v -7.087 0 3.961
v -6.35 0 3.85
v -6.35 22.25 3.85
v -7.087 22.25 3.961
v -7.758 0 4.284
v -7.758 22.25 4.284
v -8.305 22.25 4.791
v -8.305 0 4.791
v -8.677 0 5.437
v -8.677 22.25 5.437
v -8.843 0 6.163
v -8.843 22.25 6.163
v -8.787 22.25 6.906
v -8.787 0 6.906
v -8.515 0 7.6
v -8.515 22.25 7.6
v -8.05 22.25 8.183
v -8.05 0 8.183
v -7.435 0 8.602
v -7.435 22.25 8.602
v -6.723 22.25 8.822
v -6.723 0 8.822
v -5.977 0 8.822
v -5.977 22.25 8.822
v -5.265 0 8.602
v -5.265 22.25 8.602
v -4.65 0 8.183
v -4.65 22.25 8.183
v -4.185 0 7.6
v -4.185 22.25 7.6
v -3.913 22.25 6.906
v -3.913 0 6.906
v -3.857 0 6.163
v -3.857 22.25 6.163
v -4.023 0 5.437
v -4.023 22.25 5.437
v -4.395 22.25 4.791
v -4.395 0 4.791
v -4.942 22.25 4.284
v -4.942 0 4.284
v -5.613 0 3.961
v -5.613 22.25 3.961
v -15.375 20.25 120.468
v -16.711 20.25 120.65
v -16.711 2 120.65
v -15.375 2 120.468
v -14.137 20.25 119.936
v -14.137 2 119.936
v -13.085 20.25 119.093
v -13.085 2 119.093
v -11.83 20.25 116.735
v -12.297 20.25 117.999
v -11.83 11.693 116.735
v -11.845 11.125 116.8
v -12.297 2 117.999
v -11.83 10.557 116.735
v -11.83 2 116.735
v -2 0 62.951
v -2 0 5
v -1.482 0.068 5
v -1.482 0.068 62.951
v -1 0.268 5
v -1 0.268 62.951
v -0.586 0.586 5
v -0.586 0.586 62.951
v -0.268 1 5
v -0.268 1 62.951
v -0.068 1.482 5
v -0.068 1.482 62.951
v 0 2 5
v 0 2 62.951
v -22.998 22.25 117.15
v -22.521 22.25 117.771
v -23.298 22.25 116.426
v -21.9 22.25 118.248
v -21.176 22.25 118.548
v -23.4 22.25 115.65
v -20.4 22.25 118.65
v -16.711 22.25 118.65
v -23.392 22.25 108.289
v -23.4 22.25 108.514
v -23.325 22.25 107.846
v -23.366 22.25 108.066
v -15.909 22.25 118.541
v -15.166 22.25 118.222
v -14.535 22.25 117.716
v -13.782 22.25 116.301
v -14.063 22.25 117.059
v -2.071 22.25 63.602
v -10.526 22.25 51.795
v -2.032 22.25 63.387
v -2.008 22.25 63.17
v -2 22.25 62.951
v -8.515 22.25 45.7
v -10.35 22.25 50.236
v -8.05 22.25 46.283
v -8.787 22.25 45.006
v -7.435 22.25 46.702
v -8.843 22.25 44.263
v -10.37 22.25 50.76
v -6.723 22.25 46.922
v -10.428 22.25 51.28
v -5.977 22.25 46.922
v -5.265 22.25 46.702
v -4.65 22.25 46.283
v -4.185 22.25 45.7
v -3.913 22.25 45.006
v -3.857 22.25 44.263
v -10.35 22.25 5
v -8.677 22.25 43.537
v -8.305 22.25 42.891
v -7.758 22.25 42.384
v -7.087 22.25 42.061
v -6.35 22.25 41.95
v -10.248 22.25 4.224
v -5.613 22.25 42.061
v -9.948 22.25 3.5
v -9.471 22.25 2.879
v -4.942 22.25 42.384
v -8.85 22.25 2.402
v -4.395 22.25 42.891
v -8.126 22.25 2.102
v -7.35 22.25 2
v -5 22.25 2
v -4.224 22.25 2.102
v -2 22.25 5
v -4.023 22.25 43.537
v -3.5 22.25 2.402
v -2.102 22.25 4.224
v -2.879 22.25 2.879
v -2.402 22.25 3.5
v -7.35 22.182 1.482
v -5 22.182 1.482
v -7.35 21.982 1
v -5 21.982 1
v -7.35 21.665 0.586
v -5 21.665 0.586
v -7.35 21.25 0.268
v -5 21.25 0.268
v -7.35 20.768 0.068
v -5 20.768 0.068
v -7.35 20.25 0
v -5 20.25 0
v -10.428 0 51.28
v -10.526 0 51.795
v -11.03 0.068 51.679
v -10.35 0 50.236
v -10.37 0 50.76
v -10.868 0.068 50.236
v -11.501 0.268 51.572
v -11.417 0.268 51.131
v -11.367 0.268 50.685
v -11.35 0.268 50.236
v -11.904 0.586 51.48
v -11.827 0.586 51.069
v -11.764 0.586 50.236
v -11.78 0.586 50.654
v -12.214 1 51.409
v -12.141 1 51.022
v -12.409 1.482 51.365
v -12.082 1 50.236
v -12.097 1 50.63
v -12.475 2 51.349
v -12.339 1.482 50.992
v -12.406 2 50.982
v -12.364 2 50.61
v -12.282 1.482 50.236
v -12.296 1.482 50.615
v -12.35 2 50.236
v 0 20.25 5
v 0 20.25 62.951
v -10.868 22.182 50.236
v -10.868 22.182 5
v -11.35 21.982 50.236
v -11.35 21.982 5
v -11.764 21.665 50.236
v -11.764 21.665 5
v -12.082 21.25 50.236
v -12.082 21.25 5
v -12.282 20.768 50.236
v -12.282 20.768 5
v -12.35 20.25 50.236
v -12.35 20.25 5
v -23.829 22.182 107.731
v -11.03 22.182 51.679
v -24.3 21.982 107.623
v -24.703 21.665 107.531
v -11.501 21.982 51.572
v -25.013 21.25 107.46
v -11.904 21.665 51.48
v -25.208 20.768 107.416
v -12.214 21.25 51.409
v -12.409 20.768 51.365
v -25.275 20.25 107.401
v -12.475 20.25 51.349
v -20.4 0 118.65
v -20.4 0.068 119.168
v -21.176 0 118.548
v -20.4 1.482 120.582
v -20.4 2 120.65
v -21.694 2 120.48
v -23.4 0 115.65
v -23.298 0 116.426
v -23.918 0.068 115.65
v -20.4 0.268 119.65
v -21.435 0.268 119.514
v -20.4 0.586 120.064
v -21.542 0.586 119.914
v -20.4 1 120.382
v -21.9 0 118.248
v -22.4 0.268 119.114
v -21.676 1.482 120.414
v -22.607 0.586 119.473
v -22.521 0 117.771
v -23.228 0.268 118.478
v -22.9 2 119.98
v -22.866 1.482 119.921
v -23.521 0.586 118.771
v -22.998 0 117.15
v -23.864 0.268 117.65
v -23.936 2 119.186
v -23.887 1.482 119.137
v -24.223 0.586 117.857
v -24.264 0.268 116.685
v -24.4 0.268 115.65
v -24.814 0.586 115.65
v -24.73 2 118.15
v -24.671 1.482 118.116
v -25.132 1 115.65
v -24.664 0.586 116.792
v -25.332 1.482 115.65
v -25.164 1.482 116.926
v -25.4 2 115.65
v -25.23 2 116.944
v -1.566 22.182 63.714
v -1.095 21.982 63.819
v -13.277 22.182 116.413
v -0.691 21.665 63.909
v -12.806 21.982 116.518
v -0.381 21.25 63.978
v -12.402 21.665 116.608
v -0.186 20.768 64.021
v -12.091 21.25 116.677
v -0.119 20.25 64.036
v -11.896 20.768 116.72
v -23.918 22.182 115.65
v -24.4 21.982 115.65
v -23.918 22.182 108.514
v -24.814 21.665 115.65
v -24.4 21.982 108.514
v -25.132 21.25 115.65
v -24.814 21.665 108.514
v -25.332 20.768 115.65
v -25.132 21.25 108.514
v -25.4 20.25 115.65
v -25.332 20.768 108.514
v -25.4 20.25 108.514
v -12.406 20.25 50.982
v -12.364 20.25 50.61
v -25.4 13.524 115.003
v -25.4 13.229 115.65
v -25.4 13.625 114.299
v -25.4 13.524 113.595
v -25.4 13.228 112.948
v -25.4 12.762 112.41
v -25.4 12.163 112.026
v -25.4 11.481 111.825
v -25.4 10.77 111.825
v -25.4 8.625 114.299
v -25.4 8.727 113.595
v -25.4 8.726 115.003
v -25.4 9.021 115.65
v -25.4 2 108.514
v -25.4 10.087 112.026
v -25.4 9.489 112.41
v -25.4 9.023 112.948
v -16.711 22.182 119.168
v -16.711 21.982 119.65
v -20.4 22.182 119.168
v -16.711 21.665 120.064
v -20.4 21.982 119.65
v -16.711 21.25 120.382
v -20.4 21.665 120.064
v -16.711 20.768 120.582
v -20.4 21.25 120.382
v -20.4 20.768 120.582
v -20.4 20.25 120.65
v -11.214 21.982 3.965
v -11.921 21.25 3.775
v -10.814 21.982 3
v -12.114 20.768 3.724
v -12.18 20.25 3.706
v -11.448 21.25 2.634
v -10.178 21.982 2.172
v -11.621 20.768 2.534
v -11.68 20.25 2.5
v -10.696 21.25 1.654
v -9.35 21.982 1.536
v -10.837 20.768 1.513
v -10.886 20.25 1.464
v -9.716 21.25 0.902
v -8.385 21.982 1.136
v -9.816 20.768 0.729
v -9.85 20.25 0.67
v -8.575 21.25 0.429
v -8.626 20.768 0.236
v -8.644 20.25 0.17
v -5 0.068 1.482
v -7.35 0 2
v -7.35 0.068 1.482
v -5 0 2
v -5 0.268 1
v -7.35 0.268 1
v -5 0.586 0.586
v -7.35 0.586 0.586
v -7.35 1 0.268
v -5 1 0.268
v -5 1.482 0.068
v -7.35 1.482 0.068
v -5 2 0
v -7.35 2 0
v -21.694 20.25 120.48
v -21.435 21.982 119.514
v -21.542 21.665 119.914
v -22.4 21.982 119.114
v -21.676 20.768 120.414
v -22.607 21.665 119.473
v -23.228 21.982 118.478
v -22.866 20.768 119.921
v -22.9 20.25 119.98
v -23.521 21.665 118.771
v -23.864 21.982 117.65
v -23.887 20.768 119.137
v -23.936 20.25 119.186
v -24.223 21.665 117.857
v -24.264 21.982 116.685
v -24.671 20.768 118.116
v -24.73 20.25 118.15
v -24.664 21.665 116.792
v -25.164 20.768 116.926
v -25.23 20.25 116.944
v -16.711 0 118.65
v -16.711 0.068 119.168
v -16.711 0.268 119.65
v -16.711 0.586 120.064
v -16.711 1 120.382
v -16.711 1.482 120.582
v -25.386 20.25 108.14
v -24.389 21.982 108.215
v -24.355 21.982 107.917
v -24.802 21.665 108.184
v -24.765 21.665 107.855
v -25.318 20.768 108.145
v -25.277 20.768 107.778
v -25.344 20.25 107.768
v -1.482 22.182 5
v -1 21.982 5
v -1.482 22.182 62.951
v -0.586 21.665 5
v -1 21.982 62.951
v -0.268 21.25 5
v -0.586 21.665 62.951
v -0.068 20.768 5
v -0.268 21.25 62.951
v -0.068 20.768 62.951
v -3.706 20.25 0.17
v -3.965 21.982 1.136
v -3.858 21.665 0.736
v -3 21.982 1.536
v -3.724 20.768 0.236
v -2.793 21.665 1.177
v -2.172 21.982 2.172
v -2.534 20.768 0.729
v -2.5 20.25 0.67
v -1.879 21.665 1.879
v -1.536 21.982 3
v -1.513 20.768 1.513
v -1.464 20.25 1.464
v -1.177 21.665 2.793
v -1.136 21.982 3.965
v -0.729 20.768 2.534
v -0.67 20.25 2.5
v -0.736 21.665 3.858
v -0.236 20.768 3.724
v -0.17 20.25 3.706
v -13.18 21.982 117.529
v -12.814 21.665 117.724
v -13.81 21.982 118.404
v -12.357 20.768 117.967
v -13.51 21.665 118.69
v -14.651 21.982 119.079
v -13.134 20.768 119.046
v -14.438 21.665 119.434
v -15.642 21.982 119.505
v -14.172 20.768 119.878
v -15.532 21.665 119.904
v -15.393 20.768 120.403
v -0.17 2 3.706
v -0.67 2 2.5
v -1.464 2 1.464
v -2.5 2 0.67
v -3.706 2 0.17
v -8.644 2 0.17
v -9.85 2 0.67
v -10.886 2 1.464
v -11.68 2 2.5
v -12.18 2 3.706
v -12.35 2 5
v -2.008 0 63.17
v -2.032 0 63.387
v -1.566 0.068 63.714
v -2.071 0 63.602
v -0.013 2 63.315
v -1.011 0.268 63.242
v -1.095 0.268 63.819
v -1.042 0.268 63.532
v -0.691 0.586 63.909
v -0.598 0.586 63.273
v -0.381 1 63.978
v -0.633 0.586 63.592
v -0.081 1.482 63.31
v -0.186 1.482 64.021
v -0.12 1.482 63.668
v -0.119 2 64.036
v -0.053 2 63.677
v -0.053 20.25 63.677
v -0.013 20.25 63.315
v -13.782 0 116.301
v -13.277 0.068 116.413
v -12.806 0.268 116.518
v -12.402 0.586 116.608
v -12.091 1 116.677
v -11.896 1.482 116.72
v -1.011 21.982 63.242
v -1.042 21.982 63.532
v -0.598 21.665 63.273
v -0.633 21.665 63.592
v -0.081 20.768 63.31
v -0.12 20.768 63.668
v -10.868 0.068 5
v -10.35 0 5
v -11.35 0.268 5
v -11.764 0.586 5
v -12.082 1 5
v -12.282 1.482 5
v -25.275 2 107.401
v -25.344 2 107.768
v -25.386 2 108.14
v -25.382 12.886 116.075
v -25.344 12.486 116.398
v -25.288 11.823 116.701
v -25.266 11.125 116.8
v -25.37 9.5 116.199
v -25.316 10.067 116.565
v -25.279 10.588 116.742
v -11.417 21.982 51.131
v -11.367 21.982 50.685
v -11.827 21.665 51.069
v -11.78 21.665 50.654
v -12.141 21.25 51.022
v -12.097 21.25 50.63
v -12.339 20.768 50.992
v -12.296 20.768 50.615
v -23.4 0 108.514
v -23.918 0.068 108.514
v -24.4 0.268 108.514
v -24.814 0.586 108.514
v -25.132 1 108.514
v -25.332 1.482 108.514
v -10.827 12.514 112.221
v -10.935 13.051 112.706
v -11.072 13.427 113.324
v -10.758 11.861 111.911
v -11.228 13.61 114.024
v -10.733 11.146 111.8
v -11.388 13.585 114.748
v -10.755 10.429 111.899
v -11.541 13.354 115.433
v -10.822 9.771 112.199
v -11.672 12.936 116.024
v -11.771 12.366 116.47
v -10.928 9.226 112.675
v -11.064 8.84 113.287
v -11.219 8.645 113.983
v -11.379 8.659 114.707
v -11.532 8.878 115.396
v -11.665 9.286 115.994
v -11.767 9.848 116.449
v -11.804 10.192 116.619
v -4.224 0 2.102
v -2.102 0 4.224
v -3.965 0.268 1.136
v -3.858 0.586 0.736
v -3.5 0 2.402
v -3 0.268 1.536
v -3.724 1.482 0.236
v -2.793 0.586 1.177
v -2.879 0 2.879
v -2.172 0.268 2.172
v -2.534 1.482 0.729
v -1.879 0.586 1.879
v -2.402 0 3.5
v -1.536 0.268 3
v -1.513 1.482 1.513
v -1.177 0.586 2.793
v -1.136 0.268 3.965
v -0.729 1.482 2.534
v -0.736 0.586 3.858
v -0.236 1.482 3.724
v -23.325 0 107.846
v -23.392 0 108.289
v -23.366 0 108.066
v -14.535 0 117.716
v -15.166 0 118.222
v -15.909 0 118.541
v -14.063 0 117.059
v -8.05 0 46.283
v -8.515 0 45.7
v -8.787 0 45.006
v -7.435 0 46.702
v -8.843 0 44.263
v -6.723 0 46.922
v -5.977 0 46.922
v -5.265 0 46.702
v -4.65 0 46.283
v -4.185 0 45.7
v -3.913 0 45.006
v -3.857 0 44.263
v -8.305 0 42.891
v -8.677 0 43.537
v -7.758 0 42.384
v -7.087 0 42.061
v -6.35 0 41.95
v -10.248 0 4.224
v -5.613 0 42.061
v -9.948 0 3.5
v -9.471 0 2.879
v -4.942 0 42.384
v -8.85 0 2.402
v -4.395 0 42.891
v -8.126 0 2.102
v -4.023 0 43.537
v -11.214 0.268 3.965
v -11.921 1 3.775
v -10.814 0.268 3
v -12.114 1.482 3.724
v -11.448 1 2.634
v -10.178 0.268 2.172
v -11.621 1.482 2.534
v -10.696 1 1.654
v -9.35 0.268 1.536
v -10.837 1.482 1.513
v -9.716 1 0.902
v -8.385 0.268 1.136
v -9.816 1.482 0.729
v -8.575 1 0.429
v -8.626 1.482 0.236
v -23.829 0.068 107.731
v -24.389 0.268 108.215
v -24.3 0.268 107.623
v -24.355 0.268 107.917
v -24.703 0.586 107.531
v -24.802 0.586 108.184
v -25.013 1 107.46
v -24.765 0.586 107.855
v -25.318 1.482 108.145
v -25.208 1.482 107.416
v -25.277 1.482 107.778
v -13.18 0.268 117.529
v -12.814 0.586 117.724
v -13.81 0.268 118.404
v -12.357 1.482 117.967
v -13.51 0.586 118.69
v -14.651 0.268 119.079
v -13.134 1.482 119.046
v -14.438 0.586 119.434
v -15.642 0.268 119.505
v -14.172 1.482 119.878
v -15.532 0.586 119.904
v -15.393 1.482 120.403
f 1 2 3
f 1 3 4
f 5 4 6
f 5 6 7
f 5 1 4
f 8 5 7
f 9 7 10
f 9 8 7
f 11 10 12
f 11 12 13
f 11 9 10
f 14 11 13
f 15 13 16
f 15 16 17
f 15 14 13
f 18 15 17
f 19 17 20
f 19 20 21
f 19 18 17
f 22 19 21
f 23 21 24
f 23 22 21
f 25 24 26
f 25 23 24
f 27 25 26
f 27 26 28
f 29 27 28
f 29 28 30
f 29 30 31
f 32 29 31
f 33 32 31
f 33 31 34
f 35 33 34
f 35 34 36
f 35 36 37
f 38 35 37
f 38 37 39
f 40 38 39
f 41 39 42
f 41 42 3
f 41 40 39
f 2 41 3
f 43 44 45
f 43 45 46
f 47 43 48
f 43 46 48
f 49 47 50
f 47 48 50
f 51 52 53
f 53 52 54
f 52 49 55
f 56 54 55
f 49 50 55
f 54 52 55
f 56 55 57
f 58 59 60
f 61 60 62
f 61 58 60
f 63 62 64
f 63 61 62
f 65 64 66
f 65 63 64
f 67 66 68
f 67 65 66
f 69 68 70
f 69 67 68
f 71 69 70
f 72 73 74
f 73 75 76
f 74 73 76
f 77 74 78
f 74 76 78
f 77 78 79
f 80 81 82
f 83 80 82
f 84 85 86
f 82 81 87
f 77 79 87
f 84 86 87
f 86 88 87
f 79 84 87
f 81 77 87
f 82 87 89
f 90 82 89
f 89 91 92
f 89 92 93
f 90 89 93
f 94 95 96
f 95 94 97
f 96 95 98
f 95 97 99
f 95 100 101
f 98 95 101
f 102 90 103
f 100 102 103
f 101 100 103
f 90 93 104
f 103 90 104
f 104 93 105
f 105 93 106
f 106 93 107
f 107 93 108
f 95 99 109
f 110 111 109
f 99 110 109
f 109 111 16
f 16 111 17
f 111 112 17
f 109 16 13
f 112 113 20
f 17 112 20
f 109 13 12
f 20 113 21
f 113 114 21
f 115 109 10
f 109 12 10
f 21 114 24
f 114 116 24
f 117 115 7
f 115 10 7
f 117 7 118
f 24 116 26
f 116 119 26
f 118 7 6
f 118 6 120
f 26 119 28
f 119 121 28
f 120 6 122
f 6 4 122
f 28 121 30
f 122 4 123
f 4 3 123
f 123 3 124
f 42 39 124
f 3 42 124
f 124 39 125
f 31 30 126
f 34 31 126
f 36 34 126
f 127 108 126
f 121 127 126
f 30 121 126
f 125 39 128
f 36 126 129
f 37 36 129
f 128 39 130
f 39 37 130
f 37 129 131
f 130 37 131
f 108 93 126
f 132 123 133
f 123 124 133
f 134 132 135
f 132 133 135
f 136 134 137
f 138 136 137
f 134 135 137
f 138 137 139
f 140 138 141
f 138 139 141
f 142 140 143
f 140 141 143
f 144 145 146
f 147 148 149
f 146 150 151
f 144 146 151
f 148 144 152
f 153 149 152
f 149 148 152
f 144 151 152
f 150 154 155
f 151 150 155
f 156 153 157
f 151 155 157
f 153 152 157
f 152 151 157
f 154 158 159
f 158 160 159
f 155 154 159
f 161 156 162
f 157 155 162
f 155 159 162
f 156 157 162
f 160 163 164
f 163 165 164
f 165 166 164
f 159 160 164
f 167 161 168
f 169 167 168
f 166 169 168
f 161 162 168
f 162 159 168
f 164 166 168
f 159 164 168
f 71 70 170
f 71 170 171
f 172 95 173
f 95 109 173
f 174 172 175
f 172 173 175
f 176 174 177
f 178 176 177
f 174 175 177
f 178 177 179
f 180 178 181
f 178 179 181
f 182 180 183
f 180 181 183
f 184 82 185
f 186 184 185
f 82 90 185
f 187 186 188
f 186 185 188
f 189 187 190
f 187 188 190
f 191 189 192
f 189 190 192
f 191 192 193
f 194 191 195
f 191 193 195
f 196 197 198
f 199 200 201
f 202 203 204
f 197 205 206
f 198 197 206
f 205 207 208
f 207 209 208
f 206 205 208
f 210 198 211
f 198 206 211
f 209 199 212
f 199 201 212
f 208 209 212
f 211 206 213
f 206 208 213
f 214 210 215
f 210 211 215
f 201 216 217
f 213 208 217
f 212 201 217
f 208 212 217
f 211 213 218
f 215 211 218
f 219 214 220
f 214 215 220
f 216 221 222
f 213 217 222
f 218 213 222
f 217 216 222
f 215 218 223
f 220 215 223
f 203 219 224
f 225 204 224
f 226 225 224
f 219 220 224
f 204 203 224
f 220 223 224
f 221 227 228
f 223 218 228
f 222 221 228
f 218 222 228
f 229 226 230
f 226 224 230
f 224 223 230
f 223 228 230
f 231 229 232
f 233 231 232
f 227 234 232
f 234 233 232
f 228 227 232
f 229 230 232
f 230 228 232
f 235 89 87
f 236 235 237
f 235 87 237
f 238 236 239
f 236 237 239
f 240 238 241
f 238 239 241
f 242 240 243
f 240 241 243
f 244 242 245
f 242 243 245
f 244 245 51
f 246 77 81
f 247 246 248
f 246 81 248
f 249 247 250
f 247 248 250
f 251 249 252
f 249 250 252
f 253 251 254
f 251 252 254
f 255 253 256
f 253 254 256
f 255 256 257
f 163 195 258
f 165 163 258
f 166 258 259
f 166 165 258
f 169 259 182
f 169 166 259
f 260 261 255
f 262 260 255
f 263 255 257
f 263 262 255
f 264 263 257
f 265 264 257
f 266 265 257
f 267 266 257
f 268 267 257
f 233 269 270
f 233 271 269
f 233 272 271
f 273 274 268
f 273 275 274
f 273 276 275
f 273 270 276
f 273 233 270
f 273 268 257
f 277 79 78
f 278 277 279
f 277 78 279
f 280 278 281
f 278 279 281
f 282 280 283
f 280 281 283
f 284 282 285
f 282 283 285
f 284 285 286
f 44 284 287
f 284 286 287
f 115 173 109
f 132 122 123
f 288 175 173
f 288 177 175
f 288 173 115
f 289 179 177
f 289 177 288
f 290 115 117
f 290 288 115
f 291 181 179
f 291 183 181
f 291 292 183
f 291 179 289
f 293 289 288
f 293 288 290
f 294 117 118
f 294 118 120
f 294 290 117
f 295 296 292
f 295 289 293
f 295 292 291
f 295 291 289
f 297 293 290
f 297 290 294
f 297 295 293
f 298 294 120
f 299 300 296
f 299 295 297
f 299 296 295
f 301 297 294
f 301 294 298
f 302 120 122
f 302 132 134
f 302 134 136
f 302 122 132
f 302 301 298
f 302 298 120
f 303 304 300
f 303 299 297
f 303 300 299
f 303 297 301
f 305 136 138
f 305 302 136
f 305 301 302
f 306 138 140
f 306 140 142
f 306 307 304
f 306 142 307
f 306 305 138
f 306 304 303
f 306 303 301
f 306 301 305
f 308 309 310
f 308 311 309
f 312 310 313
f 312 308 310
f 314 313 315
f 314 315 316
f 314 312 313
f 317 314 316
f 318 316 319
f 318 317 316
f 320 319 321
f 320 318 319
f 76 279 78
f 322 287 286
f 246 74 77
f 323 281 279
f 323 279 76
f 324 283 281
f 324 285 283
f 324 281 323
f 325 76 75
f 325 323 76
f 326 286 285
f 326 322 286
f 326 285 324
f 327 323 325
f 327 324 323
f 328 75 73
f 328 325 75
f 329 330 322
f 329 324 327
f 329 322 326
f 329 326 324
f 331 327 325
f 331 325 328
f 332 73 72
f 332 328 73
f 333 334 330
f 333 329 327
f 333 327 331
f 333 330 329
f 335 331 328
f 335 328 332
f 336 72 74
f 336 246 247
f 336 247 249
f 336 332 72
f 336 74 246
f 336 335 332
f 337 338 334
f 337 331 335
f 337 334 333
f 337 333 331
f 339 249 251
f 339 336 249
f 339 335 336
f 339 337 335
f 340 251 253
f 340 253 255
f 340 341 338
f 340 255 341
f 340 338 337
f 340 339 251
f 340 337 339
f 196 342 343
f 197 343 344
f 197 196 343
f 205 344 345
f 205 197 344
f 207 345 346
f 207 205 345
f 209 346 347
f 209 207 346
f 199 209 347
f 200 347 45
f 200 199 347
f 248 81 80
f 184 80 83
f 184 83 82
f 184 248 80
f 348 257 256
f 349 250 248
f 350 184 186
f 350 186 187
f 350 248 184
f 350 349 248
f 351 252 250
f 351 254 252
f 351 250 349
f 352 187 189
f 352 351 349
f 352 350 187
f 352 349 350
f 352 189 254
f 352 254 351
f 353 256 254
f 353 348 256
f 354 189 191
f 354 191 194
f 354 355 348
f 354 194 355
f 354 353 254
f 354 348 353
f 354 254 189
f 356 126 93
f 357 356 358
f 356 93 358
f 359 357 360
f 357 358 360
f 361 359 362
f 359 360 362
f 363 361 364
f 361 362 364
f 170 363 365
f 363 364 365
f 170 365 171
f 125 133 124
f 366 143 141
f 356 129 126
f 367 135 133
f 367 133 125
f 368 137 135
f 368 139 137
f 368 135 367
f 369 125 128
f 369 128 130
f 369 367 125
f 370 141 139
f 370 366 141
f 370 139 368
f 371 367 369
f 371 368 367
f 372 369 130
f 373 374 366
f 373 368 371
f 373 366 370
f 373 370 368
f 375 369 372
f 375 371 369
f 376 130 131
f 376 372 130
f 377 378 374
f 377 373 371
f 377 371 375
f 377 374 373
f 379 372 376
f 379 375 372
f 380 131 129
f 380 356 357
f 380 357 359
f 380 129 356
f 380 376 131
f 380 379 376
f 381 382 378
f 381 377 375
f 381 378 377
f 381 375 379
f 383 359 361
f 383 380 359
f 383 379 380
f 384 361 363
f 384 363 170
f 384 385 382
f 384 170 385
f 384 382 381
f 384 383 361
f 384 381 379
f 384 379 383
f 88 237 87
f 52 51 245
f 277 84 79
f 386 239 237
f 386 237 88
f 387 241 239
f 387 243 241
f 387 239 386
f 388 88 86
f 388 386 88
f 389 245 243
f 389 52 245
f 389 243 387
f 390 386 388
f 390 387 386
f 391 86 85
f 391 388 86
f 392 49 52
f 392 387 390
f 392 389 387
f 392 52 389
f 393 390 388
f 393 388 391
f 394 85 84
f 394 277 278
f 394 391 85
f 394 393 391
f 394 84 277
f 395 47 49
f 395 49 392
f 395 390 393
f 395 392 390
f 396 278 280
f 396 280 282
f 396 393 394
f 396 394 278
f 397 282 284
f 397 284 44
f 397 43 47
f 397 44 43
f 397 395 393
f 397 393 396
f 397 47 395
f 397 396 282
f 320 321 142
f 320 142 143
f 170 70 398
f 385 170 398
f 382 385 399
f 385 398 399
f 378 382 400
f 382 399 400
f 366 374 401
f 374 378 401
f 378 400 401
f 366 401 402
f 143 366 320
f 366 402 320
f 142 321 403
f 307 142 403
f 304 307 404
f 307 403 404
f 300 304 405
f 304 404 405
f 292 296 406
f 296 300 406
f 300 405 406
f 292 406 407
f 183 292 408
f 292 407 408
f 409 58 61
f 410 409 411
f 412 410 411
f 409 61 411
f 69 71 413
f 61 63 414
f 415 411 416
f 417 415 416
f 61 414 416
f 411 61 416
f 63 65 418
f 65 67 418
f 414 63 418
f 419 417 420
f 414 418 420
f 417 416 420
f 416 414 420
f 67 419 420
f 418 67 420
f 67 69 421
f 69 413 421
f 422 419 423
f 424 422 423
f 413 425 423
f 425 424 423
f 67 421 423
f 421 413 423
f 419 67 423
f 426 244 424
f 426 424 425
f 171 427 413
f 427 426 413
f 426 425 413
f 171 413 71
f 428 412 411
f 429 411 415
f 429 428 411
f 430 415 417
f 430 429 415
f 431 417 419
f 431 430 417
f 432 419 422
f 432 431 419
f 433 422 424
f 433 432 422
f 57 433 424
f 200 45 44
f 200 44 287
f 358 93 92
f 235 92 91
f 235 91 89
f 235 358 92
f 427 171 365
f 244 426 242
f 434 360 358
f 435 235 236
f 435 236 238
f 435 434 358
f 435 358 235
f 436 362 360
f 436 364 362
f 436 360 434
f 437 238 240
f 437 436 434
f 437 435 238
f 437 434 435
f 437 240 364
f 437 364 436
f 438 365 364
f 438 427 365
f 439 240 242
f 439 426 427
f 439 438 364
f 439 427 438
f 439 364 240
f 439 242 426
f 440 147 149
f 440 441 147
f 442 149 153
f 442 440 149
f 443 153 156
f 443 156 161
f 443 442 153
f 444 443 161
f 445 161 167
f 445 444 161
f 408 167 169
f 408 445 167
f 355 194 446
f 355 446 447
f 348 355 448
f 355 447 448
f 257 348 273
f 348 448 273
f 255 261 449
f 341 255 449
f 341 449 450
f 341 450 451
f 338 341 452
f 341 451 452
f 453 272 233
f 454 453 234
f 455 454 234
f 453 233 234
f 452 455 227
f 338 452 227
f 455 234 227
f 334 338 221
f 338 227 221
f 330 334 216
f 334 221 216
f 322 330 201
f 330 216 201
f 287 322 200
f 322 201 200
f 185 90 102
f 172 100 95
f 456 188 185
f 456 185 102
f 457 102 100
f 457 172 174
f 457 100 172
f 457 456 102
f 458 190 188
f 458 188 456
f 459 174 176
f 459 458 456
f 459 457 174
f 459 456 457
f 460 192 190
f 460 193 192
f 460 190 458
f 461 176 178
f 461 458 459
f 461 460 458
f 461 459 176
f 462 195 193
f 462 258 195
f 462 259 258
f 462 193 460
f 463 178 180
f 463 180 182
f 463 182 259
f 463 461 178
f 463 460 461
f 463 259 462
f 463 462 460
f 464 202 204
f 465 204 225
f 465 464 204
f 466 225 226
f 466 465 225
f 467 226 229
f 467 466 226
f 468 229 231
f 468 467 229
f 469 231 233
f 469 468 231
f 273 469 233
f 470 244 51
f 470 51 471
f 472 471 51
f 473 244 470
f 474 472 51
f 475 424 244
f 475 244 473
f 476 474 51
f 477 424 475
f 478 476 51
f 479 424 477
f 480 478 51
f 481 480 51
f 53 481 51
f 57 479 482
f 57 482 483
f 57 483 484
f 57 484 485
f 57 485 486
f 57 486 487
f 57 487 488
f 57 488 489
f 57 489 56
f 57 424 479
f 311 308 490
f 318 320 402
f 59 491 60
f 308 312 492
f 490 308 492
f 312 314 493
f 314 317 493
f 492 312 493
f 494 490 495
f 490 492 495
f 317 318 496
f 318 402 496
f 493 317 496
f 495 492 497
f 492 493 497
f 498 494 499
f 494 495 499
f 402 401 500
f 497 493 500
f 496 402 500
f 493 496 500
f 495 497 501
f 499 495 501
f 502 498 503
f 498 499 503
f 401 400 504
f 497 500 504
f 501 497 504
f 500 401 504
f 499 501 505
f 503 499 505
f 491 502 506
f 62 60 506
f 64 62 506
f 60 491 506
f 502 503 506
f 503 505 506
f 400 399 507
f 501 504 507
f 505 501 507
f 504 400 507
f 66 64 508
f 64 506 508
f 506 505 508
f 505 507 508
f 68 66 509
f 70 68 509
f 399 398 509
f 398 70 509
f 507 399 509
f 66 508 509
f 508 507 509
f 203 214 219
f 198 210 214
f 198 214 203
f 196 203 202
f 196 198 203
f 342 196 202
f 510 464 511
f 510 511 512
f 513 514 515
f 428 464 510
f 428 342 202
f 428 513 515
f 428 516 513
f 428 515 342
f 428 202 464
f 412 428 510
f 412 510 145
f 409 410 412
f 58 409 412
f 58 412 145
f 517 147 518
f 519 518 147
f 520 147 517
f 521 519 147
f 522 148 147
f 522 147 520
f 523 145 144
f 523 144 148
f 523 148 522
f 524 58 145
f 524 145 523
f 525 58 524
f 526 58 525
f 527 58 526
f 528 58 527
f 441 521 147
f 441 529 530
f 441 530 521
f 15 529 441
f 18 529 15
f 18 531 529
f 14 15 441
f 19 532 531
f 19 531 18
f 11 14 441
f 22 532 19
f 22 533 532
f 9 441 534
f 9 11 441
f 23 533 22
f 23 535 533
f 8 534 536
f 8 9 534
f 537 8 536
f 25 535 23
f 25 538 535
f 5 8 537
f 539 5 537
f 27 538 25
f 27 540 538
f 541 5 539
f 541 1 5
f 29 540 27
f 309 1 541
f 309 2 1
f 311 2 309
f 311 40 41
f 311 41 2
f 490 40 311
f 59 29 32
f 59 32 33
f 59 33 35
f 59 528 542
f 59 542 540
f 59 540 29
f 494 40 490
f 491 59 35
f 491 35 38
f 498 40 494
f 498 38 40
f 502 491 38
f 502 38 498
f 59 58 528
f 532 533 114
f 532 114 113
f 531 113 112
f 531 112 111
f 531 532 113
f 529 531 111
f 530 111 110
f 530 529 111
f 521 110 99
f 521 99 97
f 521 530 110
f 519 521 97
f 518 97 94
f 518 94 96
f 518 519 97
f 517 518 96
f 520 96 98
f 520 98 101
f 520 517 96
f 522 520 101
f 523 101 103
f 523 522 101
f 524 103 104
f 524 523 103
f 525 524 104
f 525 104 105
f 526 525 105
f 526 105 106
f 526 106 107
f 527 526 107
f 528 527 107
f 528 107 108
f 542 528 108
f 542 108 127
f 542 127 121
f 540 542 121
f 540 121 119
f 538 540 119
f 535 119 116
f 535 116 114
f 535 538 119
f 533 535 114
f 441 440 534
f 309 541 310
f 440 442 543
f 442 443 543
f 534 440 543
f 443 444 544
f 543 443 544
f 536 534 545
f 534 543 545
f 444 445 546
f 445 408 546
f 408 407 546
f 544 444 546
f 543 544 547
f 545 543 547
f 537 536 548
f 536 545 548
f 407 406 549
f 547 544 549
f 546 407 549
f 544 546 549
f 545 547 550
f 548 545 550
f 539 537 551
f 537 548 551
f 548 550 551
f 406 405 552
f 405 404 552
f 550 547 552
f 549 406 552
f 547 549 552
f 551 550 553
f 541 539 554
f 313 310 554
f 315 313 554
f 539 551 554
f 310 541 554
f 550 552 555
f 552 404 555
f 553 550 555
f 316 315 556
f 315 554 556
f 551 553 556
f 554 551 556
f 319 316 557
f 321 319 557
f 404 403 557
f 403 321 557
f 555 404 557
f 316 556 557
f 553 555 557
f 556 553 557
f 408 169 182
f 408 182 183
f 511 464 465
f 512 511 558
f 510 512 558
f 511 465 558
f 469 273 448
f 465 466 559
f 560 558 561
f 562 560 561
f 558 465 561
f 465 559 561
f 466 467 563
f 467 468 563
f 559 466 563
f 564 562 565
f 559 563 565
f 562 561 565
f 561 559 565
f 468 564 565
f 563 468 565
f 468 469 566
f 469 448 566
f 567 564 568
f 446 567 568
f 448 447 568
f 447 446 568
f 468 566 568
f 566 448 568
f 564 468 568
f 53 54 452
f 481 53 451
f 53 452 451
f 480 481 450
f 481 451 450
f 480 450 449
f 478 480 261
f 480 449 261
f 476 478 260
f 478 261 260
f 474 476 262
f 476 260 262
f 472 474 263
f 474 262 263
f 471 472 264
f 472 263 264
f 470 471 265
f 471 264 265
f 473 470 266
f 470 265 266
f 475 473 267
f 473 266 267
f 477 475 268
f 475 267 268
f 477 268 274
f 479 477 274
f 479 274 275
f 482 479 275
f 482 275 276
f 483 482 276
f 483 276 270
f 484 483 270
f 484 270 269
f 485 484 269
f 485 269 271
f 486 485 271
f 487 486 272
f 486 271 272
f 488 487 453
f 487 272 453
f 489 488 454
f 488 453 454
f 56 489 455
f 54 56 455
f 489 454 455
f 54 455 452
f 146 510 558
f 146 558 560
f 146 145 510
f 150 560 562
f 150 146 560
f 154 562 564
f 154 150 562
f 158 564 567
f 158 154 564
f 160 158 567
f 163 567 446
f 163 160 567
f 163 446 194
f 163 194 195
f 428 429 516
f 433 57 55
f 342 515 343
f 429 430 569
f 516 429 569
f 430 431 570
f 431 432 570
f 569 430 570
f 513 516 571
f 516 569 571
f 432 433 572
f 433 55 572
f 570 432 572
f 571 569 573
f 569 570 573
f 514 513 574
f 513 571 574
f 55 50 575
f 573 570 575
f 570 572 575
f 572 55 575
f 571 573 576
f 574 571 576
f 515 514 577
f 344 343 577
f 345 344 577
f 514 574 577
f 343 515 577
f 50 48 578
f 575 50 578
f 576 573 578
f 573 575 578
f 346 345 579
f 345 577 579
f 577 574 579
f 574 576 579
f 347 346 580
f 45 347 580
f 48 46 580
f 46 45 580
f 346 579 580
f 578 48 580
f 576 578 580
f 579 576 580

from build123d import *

# Parameters (mm, degrees)
SKETCH2_R           = 2.5
BOSS_EXTRUDE1_DEPTH = 22.2504
CUT_EXTRUDE1_REACH  = 127.286
SKETCH3_R           = 2.5
FILLET2_R           = 5
FILLET3_R           = 2


with BuildPart() as part:
    # Sketch2 → Boss-Extrude1 (new body)
    with BuildSketch(Plane(origin=(0, 0, 0), x_dir=(1, 0, 0), z_dir=(0, 1, 0))):
        Polygon((-25.4, -107.95), (-12.35, -50.8), (-12.35, 0), (0, 0), (0, -63.5), (-12.7, -120.65), (-25.4, -120.65), align=None)
        with Locations(Location((-6.35, -44.45, 0), (0, 0, 90))):
            Circle(SKETCH2_R, mode=Mode.SUBTRACT)
        with Locations(Location((-6.35, -6.35, 0), (0, 0, 90))):
            Circle(SKETCH2_R, mode=Mode.SUBTRACT)
    extrude(amount=BOSS_EXTRUDE1_DEPTH)

    # Cut-Extrude1: up to this plane
    cut_extrude1_end = Plane(origin=(13.447058824, 22.2504, 2.988235294), z_dir=(-0.9761870601839527, 0, -0.21693045781865627))
    # Sketch3 → Cut-Extrude1 (cut, up to the surface)
    with BuildSketch(Plane.ZY.offset(25.4), mode=Mode.PRIVATE) as cut_extrude1_sk1:
        with Locations((114.3, 11.1252)):
            Circle(SKETCH3_R)
    cut_extrude1_tool1 = split(extrude(cut_extrude1_sk1.sketch, amount=-CUT_EXTRUDE1_REACH, mode=Mode.PRIVATE), bisect_by=cut_extrude1_end, keep=Keep.BOTH, mode=Mode.PRIVATE)
    add(cut_extrude1_tool1.solids().sort_by_distance((-25.4, 11.1252, 114.3))[0], mode=Mode.SUBTRACT)

    # Fillet2
    # the kernel refuses this fillet: 5 mm, written as the material it adds along each edge
    with BuildSketch(Plane(origin=(-12.35, 0, 50.8), x_dir=(-0.22261635970063726, 0, 0.9749061269648666), z_dir=(0, 1, 0))) as fillet2_piece_1:
        with BuildLine():
            CenterArc((FILLET2_R * 0.112722501926, -FILLET2_R), FILLET2_R, 90, 12.862751019)
            Line((-FILLET2_R * 0.109893857775, -FILLET2_R * 0.0250938730351), (0, 0))
            Line((0, 0), (FILLET2_R * 0.112722501926, 0))
        make_face()
    extrude(amount=22.2504)
    # the kernel refuses this fillet: 5 mm, written as the material it takes off along each edge
    with BuildSketch(Plane(origin=(-12.35, -12.5, 0), x_dir=(0, 0, 1), z_dir=(0, 1, 0)), Plane(origin=(0, -12.5, 0), x_dir=(-1, 0, 0), z_dir=(0, 1, 0))) as fillet2_2_piece_1:
        with BuildLine():
            CenterArc((FILLET2_R, FILLET2_R), FILLET2_R, 180, 90)
            Line((0, FILLET2_R), (0, 0))
            Line((0, 0), (FILLET2_R, 0))
        make_face()
    extrude(amount=47.2504, mode=Mode.SUBTRACT)
    with BuildSketch(Plane(origin=(0, -1.372152858, 63.5), x_dir=(0, 0, -1), z_dir=(0, 1, 0))) as fillet2_2_piece_2:
        with BuildLine():
            CenterArc((FILLET2_R * 0.109772228646, FILLET2_R), FILLET2_R, 257.471192291, 12.528807709)
            Line((-FILLET2_R * 0.107158229172, FILLET2_R * 0.023812939816), (0, 0))
            Line((0, 0), (FILLET2_R * 0.109772228646, 0))
        make_face()
    extrude(amount=24.994705716, mode=Mode.SUBTRACT)
    with BuildSketch(Plane(origin=(-12.7, -10.02714508, 120.65), x_dir=(0.21693045781865597, 0, -0.9761870601839527), z_dir=(0, 1, 0))) as fillet2_2_piece_3:
        with BuildLine():
            CenterArc((FILLET2_R * 0.802171606366, FILLET2_R), FILLET2_R, 192.528807709, 77.471192291)
            Line((-FILLET2_R * 0.174015453818, FILLET2_R * 0.783069542181), (0, 0))
            Line((0, 0), (FILLET2_R * 0.802171606366, 0))
        make_face()
    extrude(amount=42.304690159, mode=Mode.SUBTRACT)
    with BuildSketch(Plane(origin=(-25.4, -12.5, 120.65), x_dir=(0, 0, -1), z_dir=(0, 1, 0))) as fillet2_2_piece_4:
        with BuildLine():
            CenterArc((FILLET2_R, -FILLET2_R), FILLET2_R, 90, 90)
            Line((0, -FILLET2_R), (0, 0))
            Line((0, 0), (FILLET2_R, 0))
        make_face()
    extrude(amount=47.2504, mode=Mode.SUBTRACT)
    with BuildSketch(Plane(origin=(-25.4, -1.409031274, 107.95), x_dir=(0.2226163597006375, 0, -0.9749061269648664), z_dir=(0, 1, 0))) as fillet2_2_piece_5:
        with BuildLine():
            CenterArc((FILLET2_R * 0.112722501926, -FILLET2_R), FILLET2_R, 90, 12.862751019)
            Line((-FILLET2_R * 0.109893857775, -FILLET2_R * 0.0250938730351), (0, 0))
            Line((0, 0), (FILLET2_R * 0.112722501926, 0))
        make_face()
    extrude(amount=25.068462548, mode=Mode.SUBTRACT)

    # Fillet3
    fillet3_edges = [part.edges().sort_by_distance(p)[0] for p in [
        (-6.175, 0, 0),
        (-6.175, 22.2504, 0),
        (-18.875, 0, 79.375),
        (-12.35, 0, 27.618193745),
        (0, 0, 33.975569428),
        (-5.974493715, 0, 90.385221717),
        (-18.555429016, 0, 120.65),
        (-25.4, 0, 112.081806255),
        (-13.582221064, 0, 119.550209061),
        (-23.935533906, 0, 119.185533906),
        (-25.368533646, 0, 107.953546966),
        (-10.885533906, 0, 1.464466094),
        (-0.029855309, 0, 63.496722716),
        (-1.464466094, 0, 1.464466094),
        (0, 22.2504, 33.975569428),
        (-18.875, 22.2504, 79.375),
        (-25.4, 22.2504, 112.081806255),
        (-18.555429016, 22.2504, 120.65),
        (-5.974493715, 22.2504, 90.385221717),
        (-12.35, 22.2504, 27.618193745),
        (-13.582221064, 22.2504, 119.550209061),
        (-23.935533906, 22.2504, 119.185533906),
        (-25.368533646, 22.2504, 107.953546966),
        (-10.885533906, 22.2504, 1.464466094),
        (-0.029855309, 22.2504, 63.496722716),
        (-1.464466094, 22.2504, 1.464466094),
        (-12.381466354, 0, 50.796453034),
        (-12.381466354, 22.2504, 50.796453034),
    ]]
    fillet(fillet3_edges, radius=FILLET3_R)


solid = part.part
